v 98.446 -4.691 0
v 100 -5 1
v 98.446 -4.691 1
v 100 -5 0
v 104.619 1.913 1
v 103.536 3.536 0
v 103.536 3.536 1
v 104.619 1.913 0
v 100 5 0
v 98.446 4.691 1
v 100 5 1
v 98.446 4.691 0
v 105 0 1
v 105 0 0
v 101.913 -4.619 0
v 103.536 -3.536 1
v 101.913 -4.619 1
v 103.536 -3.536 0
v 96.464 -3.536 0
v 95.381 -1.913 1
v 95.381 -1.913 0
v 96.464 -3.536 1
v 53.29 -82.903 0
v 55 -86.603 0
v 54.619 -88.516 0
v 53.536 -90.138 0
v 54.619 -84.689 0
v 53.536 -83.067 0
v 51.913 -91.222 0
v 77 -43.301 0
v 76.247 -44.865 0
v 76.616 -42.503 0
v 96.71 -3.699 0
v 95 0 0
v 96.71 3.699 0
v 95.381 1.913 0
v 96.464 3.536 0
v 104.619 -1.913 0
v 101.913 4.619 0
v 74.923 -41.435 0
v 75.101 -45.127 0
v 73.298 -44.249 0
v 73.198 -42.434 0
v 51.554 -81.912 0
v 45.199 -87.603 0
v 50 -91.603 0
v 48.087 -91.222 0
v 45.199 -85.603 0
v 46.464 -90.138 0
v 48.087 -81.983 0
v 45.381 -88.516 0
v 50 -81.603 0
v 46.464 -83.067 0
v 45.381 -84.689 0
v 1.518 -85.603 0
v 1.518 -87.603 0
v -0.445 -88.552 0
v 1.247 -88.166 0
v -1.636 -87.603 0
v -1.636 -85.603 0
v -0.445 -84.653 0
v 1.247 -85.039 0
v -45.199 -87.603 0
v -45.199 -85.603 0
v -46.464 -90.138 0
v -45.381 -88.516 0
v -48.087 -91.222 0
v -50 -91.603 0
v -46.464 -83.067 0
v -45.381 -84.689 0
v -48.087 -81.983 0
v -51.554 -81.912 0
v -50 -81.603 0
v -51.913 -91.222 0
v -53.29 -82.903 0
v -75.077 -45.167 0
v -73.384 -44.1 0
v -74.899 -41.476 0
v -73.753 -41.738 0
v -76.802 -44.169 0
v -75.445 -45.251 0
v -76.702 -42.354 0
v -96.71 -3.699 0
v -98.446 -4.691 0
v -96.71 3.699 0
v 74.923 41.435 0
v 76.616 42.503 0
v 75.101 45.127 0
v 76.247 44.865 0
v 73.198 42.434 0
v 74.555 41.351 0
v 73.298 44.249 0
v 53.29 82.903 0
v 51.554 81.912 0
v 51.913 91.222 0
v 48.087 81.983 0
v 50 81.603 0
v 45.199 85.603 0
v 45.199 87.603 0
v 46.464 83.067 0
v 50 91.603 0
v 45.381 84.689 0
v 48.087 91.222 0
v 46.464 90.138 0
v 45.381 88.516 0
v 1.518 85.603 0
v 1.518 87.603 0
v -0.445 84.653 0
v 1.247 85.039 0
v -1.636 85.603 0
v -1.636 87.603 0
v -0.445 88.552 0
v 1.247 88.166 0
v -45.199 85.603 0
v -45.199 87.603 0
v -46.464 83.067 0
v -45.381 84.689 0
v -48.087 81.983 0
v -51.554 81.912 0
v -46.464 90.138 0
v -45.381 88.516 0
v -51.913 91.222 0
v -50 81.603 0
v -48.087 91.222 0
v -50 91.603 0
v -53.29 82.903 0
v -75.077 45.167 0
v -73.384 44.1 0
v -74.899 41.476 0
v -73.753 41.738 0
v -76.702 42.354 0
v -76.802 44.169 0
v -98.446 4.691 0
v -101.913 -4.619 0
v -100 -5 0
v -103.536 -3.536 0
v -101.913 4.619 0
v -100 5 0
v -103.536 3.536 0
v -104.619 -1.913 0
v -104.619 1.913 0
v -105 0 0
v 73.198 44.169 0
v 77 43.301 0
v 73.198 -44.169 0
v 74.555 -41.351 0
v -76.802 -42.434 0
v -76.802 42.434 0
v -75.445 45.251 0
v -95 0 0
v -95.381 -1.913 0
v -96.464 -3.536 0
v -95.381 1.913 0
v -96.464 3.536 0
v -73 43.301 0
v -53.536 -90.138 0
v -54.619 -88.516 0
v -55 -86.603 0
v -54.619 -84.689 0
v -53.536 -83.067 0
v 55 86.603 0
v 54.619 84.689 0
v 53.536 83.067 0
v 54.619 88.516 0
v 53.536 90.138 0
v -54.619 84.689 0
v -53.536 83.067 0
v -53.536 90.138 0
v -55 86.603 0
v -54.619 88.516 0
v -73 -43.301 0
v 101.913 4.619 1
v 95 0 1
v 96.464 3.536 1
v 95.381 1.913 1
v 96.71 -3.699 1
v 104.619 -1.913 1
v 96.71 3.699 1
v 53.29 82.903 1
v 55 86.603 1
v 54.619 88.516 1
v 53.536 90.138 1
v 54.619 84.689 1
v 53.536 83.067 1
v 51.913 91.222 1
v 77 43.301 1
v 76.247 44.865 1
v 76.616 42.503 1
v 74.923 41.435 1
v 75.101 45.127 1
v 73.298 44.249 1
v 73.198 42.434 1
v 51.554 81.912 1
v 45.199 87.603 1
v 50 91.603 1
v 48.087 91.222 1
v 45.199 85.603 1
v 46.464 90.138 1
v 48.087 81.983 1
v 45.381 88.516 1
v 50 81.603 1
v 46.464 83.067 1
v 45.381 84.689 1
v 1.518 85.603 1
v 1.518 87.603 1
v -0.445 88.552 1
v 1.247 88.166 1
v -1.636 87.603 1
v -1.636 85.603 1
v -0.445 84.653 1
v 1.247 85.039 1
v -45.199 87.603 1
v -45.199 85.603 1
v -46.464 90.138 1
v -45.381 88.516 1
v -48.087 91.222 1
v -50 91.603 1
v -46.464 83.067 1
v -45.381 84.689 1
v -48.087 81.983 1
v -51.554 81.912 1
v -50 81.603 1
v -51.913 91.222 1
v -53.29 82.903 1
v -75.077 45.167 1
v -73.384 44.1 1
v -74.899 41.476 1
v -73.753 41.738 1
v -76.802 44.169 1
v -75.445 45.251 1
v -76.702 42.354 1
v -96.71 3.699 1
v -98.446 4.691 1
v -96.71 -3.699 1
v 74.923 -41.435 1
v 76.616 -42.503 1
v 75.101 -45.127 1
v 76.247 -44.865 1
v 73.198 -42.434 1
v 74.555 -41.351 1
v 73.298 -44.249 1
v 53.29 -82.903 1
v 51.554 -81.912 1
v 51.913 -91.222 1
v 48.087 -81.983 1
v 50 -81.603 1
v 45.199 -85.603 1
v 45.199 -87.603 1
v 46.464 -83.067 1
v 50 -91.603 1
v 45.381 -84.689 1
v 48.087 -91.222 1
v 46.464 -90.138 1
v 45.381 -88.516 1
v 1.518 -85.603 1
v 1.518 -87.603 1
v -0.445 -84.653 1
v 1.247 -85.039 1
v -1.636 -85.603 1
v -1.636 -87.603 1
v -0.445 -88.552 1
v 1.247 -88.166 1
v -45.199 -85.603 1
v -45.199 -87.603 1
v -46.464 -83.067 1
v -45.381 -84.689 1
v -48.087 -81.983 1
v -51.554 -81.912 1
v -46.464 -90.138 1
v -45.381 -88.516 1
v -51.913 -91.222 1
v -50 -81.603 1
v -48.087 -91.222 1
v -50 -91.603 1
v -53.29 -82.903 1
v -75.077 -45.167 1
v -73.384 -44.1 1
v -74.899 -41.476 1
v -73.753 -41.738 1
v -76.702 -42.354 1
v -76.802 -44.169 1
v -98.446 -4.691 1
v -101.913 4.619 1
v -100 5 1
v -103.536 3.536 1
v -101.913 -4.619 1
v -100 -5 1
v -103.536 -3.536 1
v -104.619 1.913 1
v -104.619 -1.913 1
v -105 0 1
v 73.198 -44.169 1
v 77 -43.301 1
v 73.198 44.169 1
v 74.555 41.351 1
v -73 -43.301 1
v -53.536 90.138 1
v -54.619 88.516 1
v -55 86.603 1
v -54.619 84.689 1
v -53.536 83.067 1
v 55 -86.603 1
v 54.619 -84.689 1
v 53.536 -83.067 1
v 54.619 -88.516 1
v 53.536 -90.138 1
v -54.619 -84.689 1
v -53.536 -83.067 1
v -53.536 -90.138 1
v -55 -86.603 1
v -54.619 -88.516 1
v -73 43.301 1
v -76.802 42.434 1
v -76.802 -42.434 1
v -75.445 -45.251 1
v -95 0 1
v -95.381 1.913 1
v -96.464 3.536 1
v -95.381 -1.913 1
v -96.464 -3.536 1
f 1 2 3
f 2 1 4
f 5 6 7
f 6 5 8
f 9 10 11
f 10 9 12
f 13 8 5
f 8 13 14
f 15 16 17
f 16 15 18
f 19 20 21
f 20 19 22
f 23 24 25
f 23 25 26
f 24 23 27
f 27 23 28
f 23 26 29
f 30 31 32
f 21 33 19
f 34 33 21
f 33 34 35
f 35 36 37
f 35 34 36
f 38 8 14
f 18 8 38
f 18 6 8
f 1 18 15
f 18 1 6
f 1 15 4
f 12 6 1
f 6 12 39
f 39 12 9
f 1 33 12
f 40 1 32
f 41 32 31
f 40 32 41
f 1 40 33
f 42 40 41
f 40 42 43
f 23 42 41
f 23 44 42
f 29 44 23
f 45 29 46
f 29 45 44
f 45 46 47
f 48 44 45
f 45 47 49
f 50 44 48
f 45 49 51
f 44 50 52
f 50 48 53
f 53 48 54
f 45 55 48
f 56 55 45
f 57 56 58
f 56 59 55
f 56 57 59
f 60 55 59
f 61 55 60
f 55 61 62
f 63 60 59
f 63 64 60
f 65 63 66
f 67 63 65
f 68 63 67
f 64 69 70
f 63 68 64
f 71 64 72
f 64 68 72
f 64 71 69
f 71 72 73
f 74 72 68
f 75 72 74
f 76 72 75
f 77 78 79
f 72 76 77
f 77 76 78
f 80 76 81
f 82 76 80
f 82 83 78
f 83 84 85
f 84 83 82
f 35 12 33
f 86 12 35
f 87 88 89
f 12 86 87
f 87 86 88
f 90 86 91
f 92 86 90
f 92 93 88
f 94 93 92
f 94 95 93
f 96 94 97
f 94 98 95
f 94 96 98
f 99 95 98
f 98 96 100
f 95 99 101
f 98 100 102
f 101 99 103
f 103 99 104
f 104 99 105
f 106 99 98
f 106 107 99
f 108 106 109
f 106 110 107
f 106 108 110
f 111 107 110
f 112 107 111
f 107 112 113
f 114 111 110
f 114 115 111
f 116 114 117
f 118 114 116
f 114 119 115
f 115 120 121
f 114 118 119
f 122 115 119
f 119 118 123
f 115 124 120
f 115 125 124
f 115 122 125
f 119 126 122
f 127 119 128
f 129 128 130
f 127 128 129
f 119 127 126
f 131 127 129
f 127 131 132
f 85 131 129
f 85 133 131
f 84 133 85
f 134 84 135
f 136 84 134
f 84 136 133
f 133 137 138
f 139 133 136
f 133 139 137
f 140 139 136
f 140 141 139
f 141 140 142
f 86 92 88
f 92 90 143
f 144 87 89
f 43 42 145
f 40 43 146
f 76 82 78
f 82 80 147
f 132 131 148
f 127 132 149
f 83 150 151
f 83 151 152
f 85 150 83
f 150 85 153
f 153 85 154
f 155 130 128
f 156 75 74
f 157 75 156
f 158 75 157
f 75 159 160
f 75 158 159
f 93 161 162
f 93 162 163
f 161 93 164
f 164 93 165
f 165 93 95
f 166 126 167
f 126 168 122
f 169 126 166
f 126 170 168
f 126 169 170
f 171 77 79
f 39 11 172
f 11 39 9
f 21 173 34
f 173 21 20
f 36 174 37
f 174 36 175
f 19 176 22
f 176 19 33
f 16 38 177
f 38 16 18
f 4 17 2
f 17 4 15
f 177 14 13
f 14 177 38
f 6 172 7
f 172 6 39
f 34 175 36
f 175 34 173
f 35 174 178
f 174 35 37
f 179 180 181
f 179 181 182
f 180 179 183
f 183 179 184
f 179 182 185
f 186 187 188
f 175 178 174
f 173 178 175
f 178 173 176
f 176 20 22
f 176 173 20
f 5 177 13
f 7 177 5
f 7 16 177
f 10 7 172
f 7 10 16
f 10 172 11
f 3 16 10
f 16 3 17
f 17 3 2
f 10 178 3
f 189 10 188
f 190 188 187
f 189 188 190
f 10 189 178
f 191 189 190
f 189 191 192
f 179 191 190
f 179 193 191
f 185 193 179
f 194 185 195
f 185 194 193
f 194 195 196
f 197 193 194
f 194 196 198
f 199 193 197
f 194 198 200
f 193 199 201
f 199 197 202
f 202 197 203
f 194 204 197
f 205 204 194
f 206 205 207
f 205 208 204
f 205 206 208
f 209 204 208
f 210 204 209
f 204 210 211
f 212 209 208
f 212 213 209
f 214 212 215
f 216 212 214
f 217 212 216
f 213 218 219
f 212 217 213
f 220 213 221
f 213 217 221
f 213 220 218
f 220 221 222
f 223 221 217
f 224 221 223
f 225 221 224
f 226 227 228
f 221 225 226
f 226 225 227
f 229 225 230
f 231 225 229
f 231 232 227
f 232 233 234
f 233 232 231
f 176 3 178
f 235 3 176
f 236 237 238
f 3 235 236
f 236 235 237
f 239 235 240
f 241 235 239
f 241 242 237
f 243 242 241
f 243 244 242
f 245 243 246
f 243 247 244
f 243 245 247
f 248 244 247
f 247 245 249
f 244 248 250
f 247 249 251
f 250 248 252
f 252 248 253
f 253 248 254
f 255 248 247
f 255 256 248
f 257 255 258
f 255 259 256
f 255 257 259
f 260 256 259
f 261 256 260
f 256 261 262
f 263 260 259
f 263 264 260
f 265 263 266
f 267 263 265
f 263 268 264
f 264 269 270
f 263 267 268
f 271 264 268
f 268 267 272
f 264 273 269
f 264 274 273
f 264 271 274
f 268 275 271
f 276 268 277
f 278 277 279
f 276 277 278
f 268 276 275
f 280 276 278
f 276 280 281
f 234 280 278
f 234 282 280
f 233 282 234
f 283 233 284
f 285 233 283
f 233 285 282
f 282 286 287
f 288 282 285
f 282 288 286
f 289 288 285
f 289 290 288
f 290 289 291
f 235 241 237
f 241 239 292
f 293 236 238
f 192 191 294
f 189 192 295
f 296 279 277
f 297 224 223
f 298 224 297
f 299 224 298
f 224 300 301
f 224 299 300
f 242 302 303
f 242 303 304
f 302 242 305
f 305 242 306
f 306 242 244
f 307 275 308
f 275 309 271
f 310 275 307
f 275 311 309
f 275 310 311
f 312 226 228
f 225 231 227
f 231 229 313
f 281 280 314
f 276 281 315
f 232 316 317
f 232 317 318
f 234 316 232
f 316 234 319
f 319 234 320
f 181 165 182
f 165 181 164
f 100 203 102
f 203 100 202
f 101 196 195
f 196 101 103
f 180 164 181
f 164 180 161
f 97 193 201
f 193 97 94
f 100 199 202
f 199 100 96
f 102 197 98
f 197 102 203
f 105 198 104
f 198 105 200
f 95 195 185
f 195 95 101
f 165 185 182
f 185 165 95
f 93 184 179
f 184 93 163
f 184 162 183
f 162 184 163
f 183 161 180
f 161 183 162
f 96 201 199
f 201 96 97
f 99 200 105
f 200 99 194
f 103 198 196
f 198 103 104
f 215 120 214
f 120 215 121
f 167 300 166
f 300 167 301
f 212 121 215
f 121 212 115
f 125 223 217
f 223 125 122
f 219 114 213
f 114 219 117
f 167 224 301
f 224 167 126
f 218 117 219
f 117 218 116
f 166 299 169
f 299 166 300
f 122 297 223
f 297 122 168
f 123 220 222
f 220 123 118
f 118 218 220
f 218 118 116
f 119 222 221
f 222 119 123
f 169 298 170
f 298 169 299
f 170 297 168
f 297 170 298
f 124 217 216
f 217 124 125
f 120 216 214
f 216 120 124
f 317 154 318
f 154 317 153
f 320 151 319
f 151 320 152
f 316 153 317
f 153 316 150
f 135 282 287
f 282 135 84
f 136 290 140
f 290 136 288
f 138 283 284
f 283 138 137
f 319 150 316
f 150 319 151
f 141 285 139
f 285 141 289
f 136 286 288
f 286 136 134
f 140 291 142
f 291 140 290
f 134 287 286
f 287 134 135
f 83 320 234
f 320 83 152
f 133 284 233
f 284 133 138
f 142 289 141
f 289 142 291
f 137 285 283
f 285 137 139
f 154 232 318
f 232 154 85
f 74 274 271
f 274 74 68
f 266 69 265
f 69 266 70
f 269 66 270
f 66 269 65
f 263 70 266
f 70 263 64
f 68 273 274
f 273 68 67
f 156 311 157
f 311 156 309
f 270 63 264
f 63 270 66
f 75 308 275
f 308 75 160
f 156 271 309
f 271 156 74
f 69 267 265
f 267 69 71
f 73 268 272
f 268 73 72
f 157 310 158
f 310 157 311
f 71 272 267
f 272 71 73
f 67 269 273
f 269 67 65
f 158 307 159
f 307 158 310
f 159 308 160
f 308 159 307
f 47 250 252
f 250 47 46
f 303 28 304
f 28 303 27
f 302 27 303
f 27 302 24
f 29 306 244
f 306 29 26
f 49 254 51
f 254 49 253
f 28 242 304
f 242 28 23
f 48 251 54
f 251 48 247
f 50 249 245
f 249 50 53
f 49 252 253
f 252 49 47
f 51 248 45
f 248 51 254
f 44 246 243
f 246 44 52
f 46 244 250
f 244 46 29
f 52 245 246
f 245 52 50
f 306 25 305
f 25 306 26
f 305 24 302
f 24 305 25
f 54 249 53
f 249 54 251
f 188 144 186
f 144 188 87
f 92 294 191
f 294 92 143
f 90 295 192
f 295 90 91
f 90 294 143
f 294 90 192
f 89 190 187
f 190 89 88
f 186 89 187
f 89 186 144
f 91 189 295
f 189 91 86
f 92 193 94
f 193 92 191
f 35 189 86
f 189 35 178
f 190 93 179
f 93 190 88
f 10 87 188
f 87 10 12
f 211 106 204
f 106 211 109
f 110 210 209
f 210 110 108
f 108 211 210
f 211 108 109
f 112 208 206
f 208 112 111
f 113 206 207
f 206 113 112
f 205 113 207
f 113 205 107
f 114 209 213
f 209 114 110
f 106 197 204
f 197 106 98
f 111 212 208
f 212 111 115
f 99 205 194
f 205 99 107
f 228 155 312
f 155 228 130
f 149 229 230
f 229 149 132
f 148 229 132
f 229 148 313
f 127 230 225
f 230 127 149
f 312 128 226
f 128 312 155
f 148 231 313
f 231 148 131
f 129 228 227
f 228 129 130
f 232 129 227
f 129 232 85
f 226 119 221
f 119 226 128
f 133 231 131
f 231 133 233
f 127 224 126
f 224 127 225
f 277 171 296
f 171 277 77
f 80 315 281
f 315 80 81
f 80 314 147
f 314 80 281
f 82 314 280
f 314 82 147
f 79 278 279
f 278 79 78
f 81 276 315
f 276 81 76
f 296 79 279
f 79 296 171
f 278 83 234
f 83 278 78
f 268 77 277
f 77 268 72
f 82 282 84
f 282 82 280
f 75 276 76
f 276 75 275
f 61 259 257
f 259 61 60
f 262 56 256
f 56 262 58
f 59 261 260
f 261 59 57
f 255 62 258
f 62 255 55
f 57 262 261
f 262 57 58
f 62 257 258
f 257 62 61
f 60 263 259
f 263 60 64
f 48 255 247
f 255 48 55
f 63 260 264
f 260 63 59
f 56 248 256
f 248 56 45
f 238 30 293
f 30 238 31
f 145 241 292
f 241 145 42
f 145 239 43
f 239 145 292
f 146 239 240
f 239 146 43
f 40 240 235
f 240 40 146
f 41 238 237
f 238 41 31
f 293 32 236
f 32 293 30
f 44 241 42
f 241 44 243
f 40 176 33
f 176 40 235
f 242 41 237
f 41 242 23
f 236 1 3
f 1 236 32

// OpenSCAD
// Polygons with internal connections
//
//      Render a polygon with N (3 or more) nodes, with an 
//      optional center node. Then connect each of the nodes 
//      node to the center nodes and to the NodeConnectivity 
//      nearest neighbor nodes.

/* [Polygon] */

// [Number of points] 
_N = 6;

// [Radius] 
_Radius = 100.0;

// [Center Node]
_CenterNode = false;

/* Node */

// [Node Radius]
_NodeRadius = 5.0;

// [Node Thickness]
_NodeThickness = 1.0;

// [Node Connectivity]
_NodeConnectivity = 1;

/* Edge */

// [Edge Width]
_EdgeWidth = 2.0;

// [Inner Edge Gap]
_InnerEdgeGap = 4.0;

// [Outer Edge Gap]
_OuterEdgeGap = 1.5;

// [Edge Thickness]
_EdgeThickness = 1.0;

module Polygon(Radius, N, CenterNode, NodeRadius, NodeThickness, NodeConnectivity, EdgeWidth, EdgeThickness, OuterEdgeGap, InnerEdgeGap)
{
    X = [for (Theta = [0 : 360 / N : 360]) Radius * cos(Theta)];
    Y = [for (Theta = [0 : 360 / N : 360]) Radius * sin(Theta)];

    NodeCount = len(X) - 1;
  
    // Render nodes
    for (i = [0 : NodeCount - 1])
    {
        translate([X[i], Y[i], 0])
        {
            linear_extrude(NodeThickness)
            {
                echo(NodeRadius);
                circle(NodeRadius);
            }
        }
    }
  
    // Render center node
    if (CenterNode)
    {
        linear_extrude(NodeThickness)
        {
            circle(NodeRadius);
        }
    }
    
    // Render edge to connect center node to each node
    if (CenterNode)
    {
        for (i = [0 : NodeCount - 1])
        {
            Edge(0, 0, X[i], Y[i], EdgeThickness, EdgeWidth, InnerEdgeGap, OuterEdgeGap); 
        }
    }
    
    // Render edges to connect each node to all others
    for (i = [0 : NodeCount - 1])
    {
        for (j = [i + 1 : i + NodeConnectivity])
        {
            if (i != j)
            {
                jj = (j >= 0) ? (j % NodeCount) : (j + NodeCount);
                            
                Edge(X[i], Y[i], X[jj], Y[jj], EdgeThickness, EdgeWidth, InnerEdgeGap, OuterEdgeGap); 
            }
        }
    }
}

module Edge(X0, Y0, X1, Y1, EdgeThickness, EdgeWidth, InnerEdgeGap, OuterEdgeGap)
{
    // Compute distance between points
    DX = X1 - X0;
    DY = Y1 - Y0;
    H = sqrt(DX * DX + DY * DY);
    
    // Compute midpoint of [X0,Y0] - [X1, Y1]
    XMid = X0 + (X1 - X0) / 2;
    YMid = Y0 + (Y1 - Y0) / 2;
    
    // For debugging, plot the midpoint
    translate([XMid, YMid, 0])
    {
        color("red")
        {
            linear_extrude(EdgeThickness)    
            {
                circle(r=2);
            }
        }
    }
    
    // Compute angle between points
    A = atan2(DY, DX);

    // TODO This needs work to compute midpoint that respects InnerEdgeGap and OuterEdgeGap
    translate([XMid, YMid, 0])
    {
        rotate(A)
        {
            linear_extrude(EdgeThickness)
            {
                square([H - (InnerEdgeGap * 2), EdgeWidth], center=true);
            }
        }
    }
}


module main(Radius, N, CenterNode, NodeRadius, NodeThickness, NodeConnectivity, EdgeWidth, EdgeThickness, InnerEdgeGap, OuterEdgeGap)
{
  Polygon(Radius, N, CenterNode, NodeRadius, NodeThickness, NodeConnectivity, EdgeWidth, EdgeThickness, InnerEdgeGap, OuterEdgeGap);
}

main(_Radius, _N, _CenterNode, _NodeRadius, _NodeThickness, _NodeConnectivity, _EdgeWidth, _EdgeThickness, _InnerEdgeGap, _OuterEdgeGap);
